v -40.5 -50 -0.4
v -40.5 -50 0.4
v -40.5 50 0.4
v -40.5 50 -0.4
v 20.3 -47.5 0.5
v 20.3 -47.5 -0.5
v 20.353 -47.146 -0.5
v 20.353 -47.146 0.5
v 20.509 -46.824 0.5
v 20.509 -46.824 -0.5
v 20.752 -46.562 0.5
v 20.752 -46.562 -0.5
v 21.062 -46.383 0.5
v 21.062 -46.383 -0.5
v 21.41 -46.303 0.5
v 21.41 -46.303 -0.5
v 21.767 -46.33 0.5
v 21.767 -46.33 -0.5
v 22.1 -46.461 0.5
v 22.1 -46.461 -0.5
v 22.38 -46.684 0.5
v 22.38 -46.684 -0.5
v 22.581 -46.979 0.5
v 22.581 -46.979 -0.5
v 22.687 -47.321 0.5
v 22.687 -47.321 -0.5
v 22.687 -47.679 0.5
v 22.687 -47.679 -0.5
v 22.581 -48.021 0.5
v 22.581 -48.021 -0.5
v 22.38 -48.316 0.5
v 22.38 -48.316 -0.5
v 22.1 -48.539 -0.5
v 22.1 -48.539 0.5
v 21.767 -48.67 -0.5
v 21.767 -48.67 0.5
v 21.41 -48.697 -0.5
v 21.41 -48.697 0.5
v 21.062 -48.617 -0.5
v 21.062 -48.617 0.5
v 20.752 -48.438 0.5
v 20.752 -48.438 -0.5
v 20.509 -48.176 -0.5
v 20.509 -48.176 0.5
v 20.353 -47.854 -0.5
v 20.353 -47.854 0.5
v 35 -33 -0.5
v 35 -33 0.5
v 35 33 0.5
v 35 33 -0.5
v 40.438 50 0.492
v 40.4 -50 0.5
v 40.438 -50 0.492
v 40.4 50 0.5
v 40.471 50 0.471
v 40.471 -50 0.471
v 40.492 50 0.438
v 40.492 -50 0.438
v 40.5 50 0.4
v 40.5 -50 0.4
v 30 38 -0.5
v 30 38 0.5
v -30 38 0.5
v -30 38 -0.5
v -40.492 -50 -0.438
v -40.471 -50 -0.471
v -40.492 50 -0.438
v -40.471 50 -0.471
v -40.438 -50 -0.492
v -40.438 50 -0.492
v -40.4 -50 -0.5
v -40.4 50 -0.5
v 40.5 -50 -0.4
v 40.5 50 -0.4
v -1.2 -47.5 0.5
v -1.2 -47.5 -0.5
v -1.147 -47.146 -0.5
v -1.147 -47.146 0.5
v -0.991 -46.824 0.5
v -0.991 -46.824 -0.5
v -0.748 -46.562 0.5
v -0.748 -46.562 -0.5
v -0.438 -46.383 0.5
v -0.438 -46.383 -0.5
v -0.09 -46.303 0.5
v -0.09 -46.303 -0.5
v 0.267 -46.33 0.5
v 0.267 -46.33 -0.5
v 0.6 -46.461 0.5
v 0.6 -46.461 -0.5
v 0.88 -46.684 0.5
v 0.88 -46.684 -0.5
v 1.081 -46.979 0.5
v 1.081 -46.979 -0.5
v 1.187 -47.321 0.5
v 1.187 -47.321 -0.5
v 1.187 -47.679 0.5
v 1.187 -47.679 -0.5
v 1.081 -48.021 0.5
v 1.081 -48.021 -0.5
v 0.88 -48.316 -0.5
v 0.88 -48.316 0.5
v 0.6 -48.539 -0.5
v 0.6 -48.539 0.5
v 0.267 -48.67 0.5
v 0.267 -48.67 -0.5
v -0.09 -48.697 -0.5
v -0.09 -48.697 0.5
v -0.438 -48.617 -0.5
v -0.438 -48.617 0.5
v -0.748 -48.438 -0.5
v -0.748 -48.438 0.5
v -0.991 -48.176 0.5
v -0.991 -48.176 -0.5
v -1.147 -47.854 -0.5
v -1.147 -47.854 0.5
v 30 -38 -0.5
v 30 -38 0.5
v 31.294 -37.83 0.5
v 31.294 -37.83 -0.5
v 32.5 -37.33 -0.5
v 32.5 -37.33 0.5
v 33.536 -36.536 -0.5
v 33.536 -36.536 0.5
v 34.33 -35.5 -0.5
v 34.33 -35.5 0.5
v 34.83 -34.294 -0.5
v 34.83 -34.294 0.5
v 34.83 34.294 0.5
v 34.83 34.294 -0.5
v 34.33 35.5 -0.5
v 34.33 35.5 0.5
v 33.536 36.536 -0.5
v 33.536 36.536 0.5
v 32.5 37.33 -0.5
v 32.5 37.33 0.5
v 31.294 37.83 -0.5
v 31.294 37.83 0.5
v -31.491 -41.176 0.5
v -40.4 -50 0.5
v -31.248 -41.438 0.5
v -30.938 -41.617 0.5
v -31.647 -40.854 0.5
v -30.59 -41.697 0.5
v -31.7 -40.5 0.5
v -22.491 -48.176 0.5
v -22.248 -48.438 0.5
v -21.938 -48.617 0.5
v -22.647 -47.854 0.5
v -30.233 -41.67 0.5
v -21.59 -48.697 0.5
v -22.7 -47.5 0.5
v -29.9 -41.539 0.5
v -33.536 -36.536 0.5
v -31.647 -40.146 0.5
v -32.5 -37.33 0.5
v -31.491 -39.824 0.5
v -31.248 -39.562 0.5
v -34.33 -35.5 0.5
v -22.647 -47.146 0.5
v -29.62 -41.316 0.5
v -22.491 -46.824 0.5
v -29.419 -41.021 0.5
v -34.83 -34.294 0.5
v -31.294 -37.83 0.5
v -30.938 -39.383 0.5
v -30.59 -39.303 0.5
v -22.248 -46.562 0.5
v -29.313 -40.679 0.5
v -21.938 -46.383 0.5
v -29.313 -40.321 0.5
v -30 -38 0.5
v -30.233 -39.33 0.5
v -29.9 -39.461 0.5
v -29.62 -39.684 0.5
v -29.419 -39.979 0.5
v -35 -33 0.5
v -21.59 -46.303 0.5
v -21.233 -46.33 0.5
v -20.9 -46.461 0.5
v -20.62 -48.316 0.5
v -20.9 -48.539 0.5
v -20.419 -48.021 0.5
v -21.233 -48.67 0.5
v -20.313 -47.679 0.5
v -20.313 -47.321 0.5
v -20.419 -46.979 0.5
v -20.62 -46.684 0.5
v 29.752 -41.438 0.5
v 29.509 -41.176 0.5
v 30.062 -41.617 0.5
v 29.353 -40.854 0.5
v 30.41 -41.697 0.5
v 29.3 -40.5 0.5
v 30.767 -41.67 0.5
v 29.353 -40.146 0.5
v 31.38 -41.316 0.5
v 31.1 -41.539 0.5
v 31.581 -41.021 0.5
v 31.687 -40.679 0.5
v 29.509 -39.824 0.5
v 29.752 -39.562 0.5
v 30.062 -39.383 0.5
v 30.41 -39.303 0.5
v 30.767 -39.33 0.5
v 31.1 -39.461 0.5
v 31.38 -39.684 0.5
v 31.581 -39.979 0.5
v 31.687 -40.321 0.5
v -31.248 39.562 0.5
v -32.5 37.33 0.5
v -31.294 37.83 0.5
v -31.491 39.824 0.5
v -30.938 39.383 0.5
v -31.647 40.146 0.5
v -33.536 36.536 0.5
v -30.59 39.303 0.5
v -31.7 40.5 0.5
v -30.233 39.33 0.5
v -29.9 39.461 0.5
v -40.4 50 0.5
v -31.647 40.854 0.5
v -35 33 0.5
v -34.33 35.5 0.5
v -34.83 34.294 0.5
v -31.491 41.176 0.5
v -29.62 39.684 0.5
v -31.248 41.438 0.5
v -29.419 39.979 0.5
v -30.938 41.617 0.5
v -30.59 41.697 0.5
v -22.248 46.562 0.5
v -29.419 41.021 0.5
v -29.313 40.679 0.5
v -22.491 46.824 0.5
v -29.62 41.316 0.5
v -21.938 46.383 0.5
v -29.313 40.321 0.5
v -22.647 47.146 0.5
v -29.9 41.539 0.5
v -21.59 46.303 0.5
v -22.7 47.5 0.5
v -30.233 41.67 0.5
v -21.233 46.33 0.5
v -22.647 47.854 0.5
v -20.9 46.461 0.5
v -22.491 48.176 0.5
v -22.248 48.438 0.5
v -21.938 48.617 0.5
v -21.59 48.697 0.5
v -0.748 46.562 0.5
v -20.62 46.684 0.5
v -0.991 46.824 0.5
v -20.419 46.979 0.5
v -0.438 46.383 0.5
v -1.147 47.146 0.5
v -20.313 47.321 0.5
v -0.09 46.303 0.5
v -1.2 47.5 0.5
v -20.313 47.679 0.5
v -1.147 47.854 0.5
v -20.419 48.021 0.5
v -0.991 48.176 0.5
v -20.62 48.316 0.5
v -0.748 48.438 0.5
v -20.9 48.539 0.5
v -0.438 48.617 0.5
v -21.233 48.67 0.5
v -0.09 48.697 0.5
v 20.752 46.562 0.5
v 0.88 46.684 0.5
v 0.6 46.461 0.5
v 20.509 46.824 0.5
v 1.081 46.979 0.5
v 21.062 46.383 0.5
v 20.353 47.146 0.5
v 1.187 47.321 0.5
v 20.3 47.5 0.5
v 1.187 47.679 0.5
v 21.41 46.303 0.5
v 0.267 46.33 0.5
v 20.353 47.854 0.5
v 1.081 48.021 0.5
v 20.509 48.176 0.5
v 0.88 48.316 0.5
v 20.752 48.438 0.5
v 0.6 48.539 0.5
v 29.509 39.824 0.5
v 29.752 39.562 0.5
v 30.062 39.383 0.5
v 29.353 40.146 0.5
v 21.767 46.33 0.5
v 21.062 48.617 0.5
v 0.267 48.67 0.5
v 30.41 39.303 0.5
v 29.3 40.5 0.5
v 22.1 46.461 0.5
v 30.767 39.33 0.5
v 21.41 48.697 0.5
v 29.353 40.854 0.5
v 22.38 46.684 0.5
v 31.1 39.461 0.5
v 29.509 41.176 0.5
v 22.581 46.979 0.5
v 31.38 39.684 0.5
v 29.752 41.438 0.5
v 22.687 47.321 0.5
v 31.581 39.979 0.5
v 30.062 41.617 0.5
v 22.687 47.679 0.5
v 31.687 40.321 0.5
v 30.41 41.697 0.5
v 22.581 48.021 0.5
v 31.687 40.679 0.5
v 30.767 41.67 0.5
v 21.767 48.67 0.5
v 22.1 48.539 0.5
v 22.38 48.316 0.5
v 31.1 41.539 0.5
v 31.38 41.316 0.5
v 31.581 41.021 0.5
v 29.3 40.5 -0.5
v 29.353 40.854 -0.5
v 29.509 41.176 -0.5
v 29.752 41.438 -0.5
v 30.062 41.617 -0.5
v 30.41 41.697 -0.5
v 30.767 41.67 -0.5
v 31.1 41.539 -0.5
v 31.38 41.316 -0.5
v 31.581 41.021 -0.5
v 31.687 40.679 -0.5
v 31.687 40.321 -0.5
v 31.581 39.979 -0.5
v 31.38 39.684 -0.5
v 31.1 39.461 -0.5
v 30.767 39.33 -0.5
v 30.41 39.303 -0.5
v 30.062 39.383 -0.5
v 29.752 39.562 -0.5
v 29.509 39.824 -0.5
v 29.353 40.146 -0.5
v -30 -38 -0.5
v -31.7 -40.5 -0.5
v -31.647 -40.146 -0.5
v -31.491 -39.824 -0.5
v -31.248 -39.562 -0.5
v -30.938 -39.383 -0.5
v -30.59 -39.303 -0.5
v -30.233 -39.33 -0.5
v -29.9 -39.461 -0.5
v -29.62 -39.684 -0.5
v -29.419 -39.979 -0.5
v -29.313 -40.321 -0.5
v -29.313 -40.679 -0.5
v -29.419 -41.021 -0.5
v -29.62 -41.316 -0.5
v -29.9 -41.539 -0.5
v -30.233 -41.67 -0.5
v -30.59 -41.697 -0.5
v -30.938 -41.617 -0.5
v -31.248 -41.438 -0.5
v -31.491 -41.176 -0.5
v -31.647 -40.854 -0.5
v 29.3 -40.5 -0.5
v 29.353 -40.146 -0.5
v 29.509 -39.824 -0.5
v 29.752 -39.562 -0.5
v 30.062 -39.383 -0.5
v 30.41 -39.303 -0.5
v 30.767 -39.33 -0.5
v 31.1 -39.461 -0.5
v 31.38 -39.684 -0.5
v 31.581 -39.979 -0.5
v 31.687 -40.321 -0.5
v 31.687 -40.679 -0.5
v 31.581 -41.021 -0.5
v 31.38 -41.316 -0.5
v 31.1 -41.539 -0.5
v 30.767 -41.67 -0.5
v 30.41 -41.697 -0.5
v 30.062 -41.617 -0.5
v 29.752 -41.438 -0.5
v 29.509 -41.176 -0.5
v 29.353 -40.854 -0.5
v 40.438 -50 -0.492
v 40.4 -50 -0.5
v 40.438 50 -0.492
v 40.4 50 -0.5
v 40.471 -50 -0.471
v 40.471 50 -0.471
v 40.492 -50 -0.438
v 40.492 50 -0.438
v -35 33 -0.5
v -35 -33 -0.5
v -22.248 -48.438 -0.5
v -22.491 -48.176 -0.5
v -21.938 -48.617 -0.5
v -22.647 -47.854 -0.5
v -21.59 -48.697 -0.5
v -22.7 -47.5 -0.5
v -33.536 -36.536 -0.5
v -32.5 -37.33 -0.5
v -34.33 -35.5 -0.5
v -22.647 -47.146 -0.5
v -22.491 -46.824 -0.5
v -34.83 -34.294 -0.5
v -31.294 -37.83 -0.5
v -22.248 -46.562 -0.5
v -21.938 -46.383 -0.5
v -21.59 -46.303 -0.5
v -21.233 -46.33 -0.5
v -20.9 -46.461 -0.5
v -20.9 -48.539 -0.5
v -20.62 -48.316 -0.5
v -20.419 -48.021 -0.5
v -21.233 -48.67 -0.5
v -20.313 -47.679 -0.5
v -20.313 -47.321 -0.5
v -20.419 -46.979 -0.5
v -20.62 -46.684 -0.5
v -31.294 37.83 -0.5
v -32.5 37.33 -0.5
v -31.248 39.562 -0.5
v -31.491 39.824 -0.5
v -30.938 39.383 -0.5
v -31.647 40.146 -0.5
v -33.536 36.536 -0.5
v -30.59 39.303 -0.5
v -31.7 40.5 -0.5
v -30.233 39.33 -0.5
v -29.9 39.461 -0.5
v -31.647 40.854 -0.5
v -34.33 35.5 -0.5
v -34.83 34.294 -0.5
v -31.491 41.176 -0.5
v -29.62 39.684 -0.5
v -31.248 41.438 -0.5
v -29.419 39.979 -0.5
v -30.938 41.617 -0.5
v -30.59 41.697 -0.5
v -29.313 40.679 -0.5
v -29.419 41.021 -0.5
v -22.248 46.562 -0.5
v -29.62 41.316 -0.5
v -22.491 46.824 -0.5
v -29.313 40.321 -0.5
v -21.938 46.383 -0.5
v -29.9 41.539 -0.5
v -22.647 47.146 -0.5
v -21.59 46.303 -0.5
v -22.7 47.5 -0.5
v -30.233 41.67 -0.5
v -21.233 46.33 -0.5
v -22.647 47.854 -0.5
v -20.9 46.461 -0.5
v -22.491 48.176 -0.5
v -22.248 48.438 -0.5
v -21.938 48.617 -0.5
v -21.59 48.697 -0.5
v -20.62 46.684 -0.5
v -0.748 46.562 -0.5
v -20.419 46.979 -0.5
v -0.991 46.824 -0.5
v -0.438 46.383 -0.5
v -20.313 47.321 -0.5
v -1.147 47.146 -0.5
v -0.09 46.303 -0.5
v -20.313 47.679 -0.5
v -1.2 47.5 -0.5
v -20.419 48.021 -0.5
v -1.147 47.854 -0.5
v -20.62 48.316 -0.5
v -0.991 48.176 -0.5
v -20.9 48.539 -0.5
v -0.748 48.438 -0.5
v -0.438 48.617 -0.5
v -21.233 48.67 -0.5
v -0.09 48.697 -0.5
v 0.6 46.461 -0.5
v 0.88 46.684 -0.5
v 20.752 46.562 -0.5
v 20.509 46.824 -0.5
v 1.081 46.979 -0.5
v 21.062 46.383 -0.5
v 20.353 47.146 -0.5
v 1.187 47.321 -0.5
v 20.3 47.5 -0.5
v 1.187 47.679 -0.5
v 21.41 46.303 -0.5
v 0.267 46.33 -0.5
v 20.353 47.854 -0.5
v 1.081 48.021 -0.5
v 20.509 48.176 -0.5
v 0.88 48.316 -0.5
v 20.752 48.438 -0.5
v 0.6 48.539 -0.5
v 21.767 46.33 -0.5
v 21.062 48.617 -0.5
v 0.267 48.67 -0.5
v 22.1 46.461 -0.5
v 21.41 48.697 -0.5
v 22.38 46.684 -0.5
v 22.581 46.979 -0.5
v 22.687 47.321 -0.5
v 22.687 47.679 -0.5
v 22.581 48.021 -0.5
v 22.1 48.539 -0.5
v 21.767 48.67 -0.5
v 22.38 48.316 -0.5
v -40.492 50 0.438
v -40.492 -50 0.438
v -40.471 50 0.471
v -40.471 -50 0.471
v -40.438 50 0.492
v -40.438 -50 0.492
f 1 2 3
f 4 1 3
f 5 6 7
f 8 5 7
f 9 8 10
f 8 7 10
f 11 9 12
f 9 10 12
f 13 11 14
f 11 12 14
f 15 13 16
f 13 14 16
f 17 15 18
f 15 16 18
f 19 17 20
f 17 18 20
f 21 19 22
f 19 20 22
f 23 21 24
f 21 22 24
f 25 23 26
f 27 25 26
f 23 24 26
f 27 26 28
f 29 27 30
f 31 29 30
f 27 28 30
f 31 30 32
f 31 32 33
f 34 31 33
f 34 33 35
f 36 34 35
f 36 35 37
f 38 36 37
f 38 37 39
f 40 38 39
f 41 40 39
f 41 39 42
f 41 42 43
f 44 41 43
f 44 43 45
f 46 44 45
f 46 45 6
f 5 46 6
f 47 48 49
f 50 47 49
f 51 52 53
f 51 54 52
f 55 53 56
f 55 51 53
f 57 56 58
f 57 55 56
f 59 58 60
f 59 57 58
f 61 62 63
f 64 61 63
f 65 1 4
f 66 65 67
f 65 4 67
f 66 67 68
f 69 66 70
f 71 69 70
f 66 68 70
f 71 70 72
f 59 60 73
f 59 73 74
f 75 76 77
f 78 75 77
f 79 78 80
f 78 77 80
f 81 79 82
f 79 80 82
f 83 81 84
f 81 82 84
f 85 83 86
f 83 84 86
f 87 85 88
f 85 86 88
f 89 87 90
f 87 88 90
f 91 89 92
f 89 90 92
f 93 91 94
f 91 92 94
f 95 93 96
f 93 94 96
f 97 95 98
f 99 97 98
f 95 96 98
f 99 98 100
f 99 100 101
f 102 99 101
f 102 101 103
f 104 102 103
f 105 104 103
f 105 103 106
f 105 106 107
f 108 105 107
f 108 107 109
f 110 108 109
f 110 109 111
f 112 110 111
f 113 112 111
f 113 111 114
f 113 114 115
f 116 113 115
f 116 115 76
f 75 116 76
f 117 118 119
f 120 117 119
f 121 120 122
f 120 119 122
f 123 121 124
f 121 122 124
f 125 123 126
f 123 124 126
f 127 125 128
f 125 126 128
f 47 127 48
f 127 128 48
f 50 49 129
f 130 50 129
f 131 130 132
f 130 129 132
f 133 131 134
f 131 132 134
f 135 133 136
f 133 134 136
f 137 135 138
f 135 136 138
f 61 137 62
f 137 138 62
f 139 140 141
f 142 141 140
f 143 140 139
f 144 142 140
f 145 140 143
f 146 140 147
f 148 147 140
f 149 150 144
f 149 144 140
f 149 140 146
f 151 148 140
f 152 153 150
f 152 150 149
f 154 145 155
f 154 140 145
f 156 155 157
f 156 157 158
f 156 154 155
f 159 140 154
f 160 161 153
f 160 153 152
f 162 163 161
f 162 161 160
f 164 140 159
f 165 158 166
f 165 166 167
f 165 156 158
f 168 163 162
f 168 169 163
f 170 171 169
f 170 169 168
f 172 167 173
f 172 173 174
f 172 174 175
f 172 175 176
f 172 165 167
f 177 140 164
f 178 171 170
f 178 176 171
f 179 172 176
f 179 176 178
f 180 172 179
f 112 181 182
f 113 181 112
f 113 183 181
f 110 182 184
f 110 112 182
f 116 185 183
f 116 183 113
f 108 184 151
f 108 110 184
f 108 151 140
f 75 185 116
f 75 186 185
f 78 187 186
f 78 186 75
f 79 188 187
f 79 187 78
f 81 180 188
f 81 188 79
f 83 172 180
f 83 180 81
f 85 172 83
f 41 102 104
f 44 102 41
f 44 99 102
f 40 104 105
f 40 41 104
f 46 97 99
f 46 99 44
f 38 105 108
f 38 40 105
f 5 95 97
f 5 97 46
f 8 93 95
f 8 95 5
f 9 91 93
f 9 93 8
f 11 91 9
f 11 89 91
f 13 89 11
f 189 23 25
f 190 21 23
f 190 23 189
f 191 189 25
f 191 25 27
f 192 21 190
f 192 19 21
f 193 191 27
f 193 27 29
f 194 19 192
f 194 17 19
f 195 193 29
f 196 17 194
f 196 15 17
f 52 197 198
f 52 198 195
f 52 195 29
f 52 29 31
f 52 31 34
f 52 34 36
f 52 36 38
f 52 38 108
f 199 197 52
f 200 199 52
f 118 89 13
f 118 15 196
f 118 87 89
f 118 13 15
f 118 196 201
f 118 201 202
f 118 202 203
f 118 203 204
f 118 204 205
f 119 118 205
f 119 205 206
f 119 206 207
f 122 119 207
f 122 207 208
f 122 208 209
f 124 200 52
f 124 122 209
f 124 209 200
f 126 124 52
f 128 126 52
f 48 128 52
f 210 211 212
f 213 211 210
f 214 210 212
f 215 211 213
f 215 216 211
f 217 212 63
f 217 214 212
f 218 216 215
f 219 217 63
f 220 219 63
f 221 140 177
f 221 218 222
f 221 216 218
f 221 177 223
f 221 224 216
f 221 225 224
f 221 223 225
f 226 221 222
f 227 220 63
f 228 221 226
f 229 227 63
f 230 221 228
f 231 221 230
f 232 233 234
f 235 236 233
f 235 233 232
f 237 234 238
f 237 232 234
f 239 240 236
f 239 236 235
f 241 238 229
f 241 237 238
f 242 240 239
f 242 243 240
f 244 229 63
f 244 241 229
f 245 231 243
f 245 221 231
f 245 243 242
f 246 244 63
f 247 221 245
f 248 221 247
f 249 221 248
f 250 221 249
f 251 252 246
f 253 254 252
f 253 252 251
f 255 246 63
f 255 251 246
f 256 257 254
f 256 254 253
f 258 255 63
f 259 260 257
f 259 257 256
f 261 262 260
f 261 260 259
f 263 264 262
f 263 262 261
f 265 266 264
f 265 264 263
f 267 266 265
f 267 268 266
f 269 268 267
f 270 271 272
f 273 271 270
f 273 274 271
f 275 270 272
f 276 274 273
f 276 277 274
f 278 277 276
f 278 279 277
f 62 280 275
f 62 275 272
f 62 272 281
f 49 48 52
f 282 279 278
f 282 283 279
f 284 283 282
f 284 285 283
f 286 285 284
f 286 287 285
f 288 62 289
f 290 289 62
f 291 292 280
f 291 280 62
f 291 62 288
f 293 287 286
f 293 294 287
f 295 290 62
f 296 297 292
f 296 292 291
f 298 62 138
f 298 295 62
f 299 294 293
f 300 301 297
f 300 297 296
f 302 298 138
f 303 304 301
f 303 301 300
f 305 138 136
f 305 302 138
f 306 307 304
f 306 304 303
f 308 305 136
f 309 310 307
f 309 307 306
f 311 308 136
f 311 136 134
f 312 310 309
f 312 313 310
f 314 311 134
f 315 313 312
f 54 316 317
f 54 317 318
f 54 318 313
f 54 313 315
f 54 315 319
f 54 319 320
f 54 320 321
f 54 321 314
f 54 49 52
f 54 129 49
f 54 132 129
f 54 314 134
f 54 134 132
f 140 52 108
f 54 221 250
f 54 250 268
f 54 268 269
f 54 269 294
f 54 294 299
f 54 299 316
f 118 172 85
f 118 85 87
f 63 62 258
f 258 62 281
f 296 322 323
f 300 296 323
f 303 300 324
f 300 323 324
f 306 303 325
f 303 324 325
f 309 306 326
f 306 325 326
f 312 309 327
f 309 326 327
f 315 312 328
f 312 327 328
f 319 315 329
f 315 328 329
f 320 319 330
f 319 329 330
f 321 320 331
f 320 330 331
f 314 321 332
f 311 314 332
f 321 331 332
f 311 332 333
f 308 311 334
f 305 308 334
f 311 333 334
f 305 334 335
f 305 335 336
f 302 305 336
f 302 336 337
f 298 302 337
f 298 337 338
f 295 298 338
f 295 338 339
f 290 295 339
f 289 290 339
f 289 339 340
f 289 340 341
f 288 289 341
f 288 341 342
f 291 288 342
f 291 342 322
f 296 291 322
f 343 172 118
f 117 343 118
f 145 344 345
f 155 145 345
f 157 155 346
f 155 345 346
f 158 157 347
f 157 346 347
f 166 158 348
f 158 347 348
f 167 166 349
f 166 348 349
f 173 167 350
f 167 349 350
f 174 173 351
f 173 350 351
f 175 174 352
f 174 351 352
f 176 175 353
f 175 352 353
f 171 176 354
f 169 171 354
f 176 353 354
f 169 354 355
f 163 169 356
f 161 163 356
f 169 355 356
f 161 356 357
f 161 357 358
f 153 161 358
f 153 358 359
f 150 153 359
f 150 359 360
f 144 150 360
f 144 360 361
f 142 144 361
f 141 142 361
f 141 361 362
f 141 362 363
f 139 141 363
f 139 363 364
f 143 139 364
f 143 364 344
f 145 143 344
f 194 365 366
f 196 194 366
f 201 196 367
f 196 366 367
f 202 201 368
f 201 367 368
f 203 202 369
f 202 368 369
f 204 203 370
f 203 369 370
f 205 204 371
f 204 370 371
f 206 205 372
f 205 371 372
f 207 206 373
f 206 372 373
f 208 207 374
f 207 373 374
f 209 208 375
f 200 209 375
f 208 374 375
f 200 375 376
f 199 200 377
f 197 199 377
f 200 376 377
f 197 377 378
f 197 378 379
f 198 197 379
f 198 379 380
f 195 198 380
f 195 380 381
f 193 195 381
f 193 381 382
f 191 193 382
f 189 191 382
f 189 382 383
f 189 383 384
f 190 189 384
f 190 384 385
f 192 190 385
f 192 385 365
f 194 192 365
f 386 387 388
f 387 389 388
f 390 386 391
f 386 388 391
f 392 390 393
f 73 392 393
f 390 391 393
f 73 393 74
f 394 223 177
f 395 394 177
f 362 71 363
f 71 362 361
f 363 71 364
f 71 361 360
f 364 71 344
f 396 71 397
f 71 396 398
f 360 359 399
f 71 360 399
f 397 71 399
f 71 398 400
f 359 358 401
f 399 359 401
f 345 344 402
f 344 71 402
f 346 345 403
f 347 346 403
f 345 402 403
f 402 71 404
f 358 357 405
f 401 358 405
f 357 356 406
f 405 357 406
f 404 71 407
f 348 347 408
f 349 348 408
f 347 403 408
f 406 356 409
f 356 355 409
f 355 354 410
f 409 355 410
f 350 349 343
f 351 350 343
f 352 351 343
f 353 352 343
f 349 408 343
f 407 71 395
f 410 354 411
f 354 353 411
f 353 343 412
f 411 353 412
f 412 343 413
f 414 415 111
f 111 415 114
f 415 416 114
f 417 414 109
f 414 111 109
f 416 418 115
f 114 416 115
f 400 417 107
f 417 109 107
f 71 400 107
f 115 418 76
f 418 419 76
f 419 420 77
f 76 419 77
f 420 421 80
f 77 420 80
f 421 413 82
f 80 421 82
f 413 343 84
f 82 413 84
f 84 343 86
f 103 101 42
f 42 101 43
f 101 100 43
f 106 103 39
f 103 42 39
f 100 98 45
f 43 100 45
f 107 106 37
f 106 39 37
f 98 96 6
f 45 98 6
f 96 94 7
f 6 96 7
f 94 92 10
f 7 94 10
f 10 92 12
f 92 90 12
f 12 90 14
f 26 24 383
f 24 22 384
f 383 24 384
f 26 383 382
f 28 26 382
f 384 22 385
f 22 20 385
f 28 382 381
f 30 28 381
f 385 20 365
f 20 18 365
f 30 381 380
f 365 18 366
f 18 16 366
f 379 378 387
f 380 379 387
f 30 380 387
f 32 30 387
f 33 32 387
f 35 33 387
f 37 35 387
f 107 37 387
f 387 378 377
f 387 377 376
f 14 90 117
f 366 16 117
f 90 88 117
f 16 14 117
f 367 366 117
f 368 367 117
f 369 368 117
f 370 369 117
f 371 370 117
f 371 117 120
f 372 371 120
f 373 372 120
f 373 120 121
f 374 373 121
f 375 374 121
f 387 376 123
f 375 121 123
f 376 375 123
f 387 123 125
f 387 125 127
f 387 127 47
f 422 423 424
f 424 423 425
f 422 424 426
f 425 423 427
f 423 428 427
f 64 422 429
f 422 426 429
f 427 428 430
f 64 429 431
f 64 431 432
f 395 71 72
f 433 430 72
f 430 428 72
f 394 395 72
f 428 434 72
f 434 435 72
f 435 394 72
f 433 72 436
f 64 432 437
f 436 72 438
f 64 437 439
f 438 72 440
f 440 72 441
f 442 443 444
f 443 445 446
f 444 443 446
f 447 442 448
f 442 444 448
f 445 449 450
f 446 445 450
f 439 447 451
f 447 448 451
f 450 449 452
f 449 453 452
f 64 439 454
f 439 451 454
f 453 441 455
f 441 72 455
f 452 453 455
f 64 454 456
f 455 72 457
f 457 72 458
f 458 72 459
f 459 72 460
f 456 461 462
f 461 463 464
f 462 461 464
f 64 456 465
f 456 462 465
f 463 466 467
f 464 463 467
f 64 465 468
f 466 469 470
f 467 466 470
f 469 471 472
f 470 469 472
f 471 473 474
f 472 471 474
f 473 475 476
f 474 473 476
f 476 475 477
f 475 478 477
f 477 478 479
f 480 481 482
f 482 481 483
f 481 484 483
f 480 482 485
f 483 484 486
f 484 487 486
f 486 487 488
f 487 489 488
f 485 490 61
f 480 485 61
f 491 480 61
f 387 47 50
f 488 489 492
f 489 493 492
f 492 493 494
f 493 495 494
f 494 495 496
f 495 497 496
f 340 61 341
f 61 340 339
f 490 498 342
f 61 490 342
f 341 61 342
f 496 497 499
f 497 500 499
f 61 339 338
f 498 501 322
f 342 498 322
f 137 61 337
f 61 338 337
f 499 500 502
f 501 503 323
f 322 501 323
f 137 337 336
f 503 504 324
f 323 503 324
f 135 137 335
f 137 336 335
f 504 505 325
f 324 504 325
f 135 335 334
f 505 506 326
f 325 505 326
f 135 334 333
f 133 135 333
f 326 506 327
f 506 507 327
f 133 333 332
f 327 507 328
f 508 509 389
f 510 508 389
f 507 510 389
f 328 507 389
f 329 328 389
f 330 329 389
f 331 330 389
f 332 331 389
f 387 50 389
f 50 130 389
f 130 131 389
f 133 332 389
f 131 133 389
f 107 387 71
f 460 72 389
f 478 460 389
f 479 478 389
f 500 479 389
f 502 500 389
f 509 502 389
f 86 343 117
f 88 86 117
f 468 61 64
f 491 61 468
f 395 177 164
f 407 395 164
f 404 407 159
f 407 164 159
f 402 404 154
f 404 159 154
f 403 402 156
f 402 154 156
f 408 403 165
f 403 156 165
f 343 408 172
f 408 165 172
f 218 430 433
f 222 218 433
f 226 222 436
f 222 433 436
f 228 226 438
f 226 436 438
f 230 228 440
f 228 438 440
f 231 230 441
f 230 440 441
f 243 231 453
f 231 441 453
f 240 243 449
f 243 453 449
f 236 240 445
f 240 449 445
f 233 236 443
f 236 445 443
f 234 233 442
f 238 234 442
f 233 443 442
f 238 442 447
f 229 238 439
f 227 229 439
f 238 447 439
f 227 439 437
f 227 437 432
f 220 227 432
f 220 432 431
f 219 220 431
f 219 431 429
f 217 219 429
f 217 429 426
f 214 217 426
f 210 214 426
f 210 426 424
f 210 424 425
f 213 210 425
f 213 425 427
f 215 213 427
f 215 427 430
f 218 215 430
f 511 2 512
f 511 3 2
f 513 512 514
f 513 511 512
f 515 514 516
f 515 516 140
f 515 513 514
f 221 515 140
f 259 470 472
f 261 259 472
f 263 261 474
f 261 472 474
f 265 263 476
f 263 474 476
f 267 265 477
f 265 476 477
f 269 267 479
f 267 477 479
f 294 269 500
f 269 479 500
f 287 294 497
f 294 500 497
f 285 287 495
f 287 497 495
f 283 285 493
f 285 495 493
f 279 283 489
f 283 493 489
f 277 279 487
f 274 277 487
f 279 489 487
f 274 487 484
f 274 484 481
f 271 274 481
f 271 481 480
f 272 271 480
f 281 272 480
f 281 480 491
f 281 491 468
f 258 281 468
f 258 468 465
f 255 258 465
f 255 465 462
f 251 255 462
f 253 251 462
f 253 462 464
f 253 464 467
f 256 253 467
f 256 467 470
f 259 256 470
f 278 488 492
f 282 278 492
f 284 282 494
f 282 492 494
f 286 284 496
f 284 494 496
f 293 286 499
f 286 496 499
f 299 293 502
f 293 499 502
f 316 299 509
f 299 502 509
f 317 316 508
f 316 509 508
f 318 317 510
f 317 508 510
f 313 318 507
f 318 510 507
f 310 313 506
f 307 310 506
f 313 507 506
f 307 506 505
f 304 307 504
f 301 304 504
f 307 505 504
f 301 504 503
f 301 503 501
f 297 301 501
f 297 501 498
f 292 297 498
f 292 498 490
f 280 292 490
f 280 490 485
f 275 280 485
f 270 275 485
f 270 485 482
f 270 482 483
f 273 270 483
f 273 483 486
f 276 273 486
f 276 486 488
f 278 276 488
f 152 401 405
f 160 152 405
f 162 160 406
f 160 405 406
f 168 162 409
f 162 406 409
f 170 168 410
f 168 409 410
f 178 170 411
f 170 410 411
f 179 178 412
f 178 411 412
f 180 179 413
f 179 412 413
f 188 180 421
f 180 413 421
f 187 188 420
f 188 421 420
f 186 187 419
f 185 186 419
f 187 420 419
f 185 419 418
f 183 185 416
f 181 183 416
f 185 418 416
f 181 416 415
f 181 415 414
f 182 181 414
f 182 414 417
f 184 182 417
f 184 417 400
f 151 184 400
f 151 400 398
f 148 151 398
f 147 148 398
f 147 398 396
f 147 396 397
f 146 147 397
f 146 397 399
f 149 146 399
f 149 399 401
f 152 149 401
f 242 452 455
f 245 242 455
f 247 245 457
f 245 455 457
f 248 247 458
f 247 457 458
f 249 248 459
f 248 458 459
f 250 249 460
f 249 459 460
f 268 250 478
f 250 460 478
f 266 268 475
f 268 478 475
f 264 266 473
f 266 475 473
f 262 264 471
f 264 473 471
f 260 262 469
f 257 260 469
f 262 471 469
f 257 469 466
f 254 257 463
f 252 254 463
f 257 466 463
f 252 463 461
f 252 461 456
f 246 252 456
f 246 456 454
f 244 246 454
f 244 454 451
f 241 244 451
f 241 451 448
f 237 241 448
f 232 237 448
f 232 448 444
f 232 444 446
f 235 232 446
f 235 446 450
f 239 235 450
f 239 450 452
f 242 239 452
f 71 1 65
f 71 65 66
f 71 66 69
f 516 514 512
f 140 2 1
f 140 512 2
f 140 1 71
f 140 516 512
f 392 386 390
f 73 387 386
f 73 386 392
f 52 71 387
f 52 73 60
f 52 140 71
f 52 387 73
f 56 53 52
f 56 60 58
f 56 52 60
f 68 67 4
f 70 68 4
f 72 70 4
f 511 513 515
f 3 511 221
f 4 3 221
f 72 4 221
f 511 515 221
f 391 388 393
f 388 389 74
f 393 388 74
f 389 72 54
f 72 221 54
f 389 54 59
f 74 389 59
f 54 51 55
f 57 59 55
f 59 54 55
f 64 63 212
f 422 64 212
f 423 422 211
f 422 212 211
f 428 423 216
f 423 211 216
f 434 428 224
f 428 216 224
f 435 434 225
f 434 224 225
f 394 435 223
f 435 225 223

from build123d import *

# Parameters (mm, degrees)
SKETCH1_W           = 81
SKETCH1_H           = 100
BOSS_EXTRUDE1_DEPTH = 0.5
CUT_EXTRUDE1_DEPTH  = 65.352544627
M2_HOLE1_AD_D       = 2.4
M2_HOLE1_AD_DEPTH   = 100
M2_HOLE1_AD_TIP     = 0.721032743
M2_HOLE2_AD_D       = 2.4
M2_HOLE2_AD_DEPTH   = 100
M2_HOLE2_AD_TIP     = 0.721032743
M2_HOLE3_AE_D       = 2.4
M2_HOLE3_AE_DEPTH   = 200
M2_HOLE3_AE_TIP     = 0.721032743
FILLET1_R           = 0.1


with BuildPart() as part:
    # Sketch1 → Boss-Extrude1 (new, symmetric)
    with BuildSketch(Plane.XY):
        Rectangle(SKETCH1_W, SKETCH1_H)
    extrude(amount=BOSS_EXTRUDE1_DEPTH, both=True)

    # Sketch2 → Cut-Extrude1 (cut, through all)
    with BuildSketch(Plane.XY.offset(0.5)):
        with BuildLine():
            Line((-30, -38), (30, -38))
            ThreePointArc((30, -38), (33.535533906, -36.535533906), (35, -33))
            Line((35, -33), (35, 33))
            ThreePointArc((35, 33), (33.535533906, 36.535533906), (30, 38))
            Line((30, 38), (-30, 38))
            ThreePointArc((-30, 38), (-33.535533906, 36.535533906), (-35, 33))
            Line((-35, 33), (-35, -33))
            ThreePointArc((-35, -33), (-33.535533906, -36.535533906), (-30, -38))
        make_face()
    extrude(amount=-CUT_EXTRUDE1_DEPTH, mode=Mode.SUBTRACT)

    # M2 Hole1 - AD
    with Locations(Plane.XY.offset(0.5)):
        with Locations((-30.5, 40.5), (30.5, 40.5), (-30.5, -40.5), (30.5, -40.5)):
            Hole(M2_HOLE1_AD_D / 2, depth=M2_HOLE1_AD_DEPTH)
            with Locations((0, 0, -(M2_HOLE1_AD_DEPTH + M2_HOLE1_AD_TIP / 2))):  # 118° drill point
                Cone(0, M2_HOLE1_AD_D / 2, M2_HOLE1_AD_TIP, mode=Mode.SUBTRACT)

    # M2 Hole2 - AD
    with Locations(Plane.XY.offset(0.5)):
        with Locations((-21.5, 47.5), (21.5, 47.5), (-21.5, -47.5), (21.5, -47.5)):
            Hole(M2_HOLE2_AD_D / 2, depth=M2_HOLE2_AD_DEPTH)
            with Locations((0, 0, -(M2_HOLE2_AD_DEPTH + M2_HOLE2_AD_TIP / 2))):  # 118° drill point
                Cone(0, M2_HOLE2_AD_D / 2, M2_HOLE2_AD_TIP, mode=Mode.SUBTRACT)

    # M2 Hole3 - AE
    with Locations(Plane.XY.offset(0.5)):
        with Locations((0, 47.5), (0, -47.5)):
            Hole(M2_HOLE3_AE_D / 2, depth=M2_HOLE3_AE_DEPTH)
            with Locations((0, 0, -(M2_HOLE3_AE_DEPTH + M2_HOLE3_AE_TIP / 2))):  # 118° drill point
                Cone(0, M2_HOLE3_AE_D / 2, M2_HOLE3_AE_TIP, mode=Mode.SUBTRACT)

    # Fillet1
    fillet1_edges = [part.edges().sort_by_distance(p)[0] for p in [
        (-40.5, 0, 0.5),
        (40.5, 0, 0.5),
        (-40.5, 0, -0.5),
        (40.5, 0, -0.5),
    ]]
    fillet(fillet1_edges, radius=FILLET1_R)


solid = part.part
